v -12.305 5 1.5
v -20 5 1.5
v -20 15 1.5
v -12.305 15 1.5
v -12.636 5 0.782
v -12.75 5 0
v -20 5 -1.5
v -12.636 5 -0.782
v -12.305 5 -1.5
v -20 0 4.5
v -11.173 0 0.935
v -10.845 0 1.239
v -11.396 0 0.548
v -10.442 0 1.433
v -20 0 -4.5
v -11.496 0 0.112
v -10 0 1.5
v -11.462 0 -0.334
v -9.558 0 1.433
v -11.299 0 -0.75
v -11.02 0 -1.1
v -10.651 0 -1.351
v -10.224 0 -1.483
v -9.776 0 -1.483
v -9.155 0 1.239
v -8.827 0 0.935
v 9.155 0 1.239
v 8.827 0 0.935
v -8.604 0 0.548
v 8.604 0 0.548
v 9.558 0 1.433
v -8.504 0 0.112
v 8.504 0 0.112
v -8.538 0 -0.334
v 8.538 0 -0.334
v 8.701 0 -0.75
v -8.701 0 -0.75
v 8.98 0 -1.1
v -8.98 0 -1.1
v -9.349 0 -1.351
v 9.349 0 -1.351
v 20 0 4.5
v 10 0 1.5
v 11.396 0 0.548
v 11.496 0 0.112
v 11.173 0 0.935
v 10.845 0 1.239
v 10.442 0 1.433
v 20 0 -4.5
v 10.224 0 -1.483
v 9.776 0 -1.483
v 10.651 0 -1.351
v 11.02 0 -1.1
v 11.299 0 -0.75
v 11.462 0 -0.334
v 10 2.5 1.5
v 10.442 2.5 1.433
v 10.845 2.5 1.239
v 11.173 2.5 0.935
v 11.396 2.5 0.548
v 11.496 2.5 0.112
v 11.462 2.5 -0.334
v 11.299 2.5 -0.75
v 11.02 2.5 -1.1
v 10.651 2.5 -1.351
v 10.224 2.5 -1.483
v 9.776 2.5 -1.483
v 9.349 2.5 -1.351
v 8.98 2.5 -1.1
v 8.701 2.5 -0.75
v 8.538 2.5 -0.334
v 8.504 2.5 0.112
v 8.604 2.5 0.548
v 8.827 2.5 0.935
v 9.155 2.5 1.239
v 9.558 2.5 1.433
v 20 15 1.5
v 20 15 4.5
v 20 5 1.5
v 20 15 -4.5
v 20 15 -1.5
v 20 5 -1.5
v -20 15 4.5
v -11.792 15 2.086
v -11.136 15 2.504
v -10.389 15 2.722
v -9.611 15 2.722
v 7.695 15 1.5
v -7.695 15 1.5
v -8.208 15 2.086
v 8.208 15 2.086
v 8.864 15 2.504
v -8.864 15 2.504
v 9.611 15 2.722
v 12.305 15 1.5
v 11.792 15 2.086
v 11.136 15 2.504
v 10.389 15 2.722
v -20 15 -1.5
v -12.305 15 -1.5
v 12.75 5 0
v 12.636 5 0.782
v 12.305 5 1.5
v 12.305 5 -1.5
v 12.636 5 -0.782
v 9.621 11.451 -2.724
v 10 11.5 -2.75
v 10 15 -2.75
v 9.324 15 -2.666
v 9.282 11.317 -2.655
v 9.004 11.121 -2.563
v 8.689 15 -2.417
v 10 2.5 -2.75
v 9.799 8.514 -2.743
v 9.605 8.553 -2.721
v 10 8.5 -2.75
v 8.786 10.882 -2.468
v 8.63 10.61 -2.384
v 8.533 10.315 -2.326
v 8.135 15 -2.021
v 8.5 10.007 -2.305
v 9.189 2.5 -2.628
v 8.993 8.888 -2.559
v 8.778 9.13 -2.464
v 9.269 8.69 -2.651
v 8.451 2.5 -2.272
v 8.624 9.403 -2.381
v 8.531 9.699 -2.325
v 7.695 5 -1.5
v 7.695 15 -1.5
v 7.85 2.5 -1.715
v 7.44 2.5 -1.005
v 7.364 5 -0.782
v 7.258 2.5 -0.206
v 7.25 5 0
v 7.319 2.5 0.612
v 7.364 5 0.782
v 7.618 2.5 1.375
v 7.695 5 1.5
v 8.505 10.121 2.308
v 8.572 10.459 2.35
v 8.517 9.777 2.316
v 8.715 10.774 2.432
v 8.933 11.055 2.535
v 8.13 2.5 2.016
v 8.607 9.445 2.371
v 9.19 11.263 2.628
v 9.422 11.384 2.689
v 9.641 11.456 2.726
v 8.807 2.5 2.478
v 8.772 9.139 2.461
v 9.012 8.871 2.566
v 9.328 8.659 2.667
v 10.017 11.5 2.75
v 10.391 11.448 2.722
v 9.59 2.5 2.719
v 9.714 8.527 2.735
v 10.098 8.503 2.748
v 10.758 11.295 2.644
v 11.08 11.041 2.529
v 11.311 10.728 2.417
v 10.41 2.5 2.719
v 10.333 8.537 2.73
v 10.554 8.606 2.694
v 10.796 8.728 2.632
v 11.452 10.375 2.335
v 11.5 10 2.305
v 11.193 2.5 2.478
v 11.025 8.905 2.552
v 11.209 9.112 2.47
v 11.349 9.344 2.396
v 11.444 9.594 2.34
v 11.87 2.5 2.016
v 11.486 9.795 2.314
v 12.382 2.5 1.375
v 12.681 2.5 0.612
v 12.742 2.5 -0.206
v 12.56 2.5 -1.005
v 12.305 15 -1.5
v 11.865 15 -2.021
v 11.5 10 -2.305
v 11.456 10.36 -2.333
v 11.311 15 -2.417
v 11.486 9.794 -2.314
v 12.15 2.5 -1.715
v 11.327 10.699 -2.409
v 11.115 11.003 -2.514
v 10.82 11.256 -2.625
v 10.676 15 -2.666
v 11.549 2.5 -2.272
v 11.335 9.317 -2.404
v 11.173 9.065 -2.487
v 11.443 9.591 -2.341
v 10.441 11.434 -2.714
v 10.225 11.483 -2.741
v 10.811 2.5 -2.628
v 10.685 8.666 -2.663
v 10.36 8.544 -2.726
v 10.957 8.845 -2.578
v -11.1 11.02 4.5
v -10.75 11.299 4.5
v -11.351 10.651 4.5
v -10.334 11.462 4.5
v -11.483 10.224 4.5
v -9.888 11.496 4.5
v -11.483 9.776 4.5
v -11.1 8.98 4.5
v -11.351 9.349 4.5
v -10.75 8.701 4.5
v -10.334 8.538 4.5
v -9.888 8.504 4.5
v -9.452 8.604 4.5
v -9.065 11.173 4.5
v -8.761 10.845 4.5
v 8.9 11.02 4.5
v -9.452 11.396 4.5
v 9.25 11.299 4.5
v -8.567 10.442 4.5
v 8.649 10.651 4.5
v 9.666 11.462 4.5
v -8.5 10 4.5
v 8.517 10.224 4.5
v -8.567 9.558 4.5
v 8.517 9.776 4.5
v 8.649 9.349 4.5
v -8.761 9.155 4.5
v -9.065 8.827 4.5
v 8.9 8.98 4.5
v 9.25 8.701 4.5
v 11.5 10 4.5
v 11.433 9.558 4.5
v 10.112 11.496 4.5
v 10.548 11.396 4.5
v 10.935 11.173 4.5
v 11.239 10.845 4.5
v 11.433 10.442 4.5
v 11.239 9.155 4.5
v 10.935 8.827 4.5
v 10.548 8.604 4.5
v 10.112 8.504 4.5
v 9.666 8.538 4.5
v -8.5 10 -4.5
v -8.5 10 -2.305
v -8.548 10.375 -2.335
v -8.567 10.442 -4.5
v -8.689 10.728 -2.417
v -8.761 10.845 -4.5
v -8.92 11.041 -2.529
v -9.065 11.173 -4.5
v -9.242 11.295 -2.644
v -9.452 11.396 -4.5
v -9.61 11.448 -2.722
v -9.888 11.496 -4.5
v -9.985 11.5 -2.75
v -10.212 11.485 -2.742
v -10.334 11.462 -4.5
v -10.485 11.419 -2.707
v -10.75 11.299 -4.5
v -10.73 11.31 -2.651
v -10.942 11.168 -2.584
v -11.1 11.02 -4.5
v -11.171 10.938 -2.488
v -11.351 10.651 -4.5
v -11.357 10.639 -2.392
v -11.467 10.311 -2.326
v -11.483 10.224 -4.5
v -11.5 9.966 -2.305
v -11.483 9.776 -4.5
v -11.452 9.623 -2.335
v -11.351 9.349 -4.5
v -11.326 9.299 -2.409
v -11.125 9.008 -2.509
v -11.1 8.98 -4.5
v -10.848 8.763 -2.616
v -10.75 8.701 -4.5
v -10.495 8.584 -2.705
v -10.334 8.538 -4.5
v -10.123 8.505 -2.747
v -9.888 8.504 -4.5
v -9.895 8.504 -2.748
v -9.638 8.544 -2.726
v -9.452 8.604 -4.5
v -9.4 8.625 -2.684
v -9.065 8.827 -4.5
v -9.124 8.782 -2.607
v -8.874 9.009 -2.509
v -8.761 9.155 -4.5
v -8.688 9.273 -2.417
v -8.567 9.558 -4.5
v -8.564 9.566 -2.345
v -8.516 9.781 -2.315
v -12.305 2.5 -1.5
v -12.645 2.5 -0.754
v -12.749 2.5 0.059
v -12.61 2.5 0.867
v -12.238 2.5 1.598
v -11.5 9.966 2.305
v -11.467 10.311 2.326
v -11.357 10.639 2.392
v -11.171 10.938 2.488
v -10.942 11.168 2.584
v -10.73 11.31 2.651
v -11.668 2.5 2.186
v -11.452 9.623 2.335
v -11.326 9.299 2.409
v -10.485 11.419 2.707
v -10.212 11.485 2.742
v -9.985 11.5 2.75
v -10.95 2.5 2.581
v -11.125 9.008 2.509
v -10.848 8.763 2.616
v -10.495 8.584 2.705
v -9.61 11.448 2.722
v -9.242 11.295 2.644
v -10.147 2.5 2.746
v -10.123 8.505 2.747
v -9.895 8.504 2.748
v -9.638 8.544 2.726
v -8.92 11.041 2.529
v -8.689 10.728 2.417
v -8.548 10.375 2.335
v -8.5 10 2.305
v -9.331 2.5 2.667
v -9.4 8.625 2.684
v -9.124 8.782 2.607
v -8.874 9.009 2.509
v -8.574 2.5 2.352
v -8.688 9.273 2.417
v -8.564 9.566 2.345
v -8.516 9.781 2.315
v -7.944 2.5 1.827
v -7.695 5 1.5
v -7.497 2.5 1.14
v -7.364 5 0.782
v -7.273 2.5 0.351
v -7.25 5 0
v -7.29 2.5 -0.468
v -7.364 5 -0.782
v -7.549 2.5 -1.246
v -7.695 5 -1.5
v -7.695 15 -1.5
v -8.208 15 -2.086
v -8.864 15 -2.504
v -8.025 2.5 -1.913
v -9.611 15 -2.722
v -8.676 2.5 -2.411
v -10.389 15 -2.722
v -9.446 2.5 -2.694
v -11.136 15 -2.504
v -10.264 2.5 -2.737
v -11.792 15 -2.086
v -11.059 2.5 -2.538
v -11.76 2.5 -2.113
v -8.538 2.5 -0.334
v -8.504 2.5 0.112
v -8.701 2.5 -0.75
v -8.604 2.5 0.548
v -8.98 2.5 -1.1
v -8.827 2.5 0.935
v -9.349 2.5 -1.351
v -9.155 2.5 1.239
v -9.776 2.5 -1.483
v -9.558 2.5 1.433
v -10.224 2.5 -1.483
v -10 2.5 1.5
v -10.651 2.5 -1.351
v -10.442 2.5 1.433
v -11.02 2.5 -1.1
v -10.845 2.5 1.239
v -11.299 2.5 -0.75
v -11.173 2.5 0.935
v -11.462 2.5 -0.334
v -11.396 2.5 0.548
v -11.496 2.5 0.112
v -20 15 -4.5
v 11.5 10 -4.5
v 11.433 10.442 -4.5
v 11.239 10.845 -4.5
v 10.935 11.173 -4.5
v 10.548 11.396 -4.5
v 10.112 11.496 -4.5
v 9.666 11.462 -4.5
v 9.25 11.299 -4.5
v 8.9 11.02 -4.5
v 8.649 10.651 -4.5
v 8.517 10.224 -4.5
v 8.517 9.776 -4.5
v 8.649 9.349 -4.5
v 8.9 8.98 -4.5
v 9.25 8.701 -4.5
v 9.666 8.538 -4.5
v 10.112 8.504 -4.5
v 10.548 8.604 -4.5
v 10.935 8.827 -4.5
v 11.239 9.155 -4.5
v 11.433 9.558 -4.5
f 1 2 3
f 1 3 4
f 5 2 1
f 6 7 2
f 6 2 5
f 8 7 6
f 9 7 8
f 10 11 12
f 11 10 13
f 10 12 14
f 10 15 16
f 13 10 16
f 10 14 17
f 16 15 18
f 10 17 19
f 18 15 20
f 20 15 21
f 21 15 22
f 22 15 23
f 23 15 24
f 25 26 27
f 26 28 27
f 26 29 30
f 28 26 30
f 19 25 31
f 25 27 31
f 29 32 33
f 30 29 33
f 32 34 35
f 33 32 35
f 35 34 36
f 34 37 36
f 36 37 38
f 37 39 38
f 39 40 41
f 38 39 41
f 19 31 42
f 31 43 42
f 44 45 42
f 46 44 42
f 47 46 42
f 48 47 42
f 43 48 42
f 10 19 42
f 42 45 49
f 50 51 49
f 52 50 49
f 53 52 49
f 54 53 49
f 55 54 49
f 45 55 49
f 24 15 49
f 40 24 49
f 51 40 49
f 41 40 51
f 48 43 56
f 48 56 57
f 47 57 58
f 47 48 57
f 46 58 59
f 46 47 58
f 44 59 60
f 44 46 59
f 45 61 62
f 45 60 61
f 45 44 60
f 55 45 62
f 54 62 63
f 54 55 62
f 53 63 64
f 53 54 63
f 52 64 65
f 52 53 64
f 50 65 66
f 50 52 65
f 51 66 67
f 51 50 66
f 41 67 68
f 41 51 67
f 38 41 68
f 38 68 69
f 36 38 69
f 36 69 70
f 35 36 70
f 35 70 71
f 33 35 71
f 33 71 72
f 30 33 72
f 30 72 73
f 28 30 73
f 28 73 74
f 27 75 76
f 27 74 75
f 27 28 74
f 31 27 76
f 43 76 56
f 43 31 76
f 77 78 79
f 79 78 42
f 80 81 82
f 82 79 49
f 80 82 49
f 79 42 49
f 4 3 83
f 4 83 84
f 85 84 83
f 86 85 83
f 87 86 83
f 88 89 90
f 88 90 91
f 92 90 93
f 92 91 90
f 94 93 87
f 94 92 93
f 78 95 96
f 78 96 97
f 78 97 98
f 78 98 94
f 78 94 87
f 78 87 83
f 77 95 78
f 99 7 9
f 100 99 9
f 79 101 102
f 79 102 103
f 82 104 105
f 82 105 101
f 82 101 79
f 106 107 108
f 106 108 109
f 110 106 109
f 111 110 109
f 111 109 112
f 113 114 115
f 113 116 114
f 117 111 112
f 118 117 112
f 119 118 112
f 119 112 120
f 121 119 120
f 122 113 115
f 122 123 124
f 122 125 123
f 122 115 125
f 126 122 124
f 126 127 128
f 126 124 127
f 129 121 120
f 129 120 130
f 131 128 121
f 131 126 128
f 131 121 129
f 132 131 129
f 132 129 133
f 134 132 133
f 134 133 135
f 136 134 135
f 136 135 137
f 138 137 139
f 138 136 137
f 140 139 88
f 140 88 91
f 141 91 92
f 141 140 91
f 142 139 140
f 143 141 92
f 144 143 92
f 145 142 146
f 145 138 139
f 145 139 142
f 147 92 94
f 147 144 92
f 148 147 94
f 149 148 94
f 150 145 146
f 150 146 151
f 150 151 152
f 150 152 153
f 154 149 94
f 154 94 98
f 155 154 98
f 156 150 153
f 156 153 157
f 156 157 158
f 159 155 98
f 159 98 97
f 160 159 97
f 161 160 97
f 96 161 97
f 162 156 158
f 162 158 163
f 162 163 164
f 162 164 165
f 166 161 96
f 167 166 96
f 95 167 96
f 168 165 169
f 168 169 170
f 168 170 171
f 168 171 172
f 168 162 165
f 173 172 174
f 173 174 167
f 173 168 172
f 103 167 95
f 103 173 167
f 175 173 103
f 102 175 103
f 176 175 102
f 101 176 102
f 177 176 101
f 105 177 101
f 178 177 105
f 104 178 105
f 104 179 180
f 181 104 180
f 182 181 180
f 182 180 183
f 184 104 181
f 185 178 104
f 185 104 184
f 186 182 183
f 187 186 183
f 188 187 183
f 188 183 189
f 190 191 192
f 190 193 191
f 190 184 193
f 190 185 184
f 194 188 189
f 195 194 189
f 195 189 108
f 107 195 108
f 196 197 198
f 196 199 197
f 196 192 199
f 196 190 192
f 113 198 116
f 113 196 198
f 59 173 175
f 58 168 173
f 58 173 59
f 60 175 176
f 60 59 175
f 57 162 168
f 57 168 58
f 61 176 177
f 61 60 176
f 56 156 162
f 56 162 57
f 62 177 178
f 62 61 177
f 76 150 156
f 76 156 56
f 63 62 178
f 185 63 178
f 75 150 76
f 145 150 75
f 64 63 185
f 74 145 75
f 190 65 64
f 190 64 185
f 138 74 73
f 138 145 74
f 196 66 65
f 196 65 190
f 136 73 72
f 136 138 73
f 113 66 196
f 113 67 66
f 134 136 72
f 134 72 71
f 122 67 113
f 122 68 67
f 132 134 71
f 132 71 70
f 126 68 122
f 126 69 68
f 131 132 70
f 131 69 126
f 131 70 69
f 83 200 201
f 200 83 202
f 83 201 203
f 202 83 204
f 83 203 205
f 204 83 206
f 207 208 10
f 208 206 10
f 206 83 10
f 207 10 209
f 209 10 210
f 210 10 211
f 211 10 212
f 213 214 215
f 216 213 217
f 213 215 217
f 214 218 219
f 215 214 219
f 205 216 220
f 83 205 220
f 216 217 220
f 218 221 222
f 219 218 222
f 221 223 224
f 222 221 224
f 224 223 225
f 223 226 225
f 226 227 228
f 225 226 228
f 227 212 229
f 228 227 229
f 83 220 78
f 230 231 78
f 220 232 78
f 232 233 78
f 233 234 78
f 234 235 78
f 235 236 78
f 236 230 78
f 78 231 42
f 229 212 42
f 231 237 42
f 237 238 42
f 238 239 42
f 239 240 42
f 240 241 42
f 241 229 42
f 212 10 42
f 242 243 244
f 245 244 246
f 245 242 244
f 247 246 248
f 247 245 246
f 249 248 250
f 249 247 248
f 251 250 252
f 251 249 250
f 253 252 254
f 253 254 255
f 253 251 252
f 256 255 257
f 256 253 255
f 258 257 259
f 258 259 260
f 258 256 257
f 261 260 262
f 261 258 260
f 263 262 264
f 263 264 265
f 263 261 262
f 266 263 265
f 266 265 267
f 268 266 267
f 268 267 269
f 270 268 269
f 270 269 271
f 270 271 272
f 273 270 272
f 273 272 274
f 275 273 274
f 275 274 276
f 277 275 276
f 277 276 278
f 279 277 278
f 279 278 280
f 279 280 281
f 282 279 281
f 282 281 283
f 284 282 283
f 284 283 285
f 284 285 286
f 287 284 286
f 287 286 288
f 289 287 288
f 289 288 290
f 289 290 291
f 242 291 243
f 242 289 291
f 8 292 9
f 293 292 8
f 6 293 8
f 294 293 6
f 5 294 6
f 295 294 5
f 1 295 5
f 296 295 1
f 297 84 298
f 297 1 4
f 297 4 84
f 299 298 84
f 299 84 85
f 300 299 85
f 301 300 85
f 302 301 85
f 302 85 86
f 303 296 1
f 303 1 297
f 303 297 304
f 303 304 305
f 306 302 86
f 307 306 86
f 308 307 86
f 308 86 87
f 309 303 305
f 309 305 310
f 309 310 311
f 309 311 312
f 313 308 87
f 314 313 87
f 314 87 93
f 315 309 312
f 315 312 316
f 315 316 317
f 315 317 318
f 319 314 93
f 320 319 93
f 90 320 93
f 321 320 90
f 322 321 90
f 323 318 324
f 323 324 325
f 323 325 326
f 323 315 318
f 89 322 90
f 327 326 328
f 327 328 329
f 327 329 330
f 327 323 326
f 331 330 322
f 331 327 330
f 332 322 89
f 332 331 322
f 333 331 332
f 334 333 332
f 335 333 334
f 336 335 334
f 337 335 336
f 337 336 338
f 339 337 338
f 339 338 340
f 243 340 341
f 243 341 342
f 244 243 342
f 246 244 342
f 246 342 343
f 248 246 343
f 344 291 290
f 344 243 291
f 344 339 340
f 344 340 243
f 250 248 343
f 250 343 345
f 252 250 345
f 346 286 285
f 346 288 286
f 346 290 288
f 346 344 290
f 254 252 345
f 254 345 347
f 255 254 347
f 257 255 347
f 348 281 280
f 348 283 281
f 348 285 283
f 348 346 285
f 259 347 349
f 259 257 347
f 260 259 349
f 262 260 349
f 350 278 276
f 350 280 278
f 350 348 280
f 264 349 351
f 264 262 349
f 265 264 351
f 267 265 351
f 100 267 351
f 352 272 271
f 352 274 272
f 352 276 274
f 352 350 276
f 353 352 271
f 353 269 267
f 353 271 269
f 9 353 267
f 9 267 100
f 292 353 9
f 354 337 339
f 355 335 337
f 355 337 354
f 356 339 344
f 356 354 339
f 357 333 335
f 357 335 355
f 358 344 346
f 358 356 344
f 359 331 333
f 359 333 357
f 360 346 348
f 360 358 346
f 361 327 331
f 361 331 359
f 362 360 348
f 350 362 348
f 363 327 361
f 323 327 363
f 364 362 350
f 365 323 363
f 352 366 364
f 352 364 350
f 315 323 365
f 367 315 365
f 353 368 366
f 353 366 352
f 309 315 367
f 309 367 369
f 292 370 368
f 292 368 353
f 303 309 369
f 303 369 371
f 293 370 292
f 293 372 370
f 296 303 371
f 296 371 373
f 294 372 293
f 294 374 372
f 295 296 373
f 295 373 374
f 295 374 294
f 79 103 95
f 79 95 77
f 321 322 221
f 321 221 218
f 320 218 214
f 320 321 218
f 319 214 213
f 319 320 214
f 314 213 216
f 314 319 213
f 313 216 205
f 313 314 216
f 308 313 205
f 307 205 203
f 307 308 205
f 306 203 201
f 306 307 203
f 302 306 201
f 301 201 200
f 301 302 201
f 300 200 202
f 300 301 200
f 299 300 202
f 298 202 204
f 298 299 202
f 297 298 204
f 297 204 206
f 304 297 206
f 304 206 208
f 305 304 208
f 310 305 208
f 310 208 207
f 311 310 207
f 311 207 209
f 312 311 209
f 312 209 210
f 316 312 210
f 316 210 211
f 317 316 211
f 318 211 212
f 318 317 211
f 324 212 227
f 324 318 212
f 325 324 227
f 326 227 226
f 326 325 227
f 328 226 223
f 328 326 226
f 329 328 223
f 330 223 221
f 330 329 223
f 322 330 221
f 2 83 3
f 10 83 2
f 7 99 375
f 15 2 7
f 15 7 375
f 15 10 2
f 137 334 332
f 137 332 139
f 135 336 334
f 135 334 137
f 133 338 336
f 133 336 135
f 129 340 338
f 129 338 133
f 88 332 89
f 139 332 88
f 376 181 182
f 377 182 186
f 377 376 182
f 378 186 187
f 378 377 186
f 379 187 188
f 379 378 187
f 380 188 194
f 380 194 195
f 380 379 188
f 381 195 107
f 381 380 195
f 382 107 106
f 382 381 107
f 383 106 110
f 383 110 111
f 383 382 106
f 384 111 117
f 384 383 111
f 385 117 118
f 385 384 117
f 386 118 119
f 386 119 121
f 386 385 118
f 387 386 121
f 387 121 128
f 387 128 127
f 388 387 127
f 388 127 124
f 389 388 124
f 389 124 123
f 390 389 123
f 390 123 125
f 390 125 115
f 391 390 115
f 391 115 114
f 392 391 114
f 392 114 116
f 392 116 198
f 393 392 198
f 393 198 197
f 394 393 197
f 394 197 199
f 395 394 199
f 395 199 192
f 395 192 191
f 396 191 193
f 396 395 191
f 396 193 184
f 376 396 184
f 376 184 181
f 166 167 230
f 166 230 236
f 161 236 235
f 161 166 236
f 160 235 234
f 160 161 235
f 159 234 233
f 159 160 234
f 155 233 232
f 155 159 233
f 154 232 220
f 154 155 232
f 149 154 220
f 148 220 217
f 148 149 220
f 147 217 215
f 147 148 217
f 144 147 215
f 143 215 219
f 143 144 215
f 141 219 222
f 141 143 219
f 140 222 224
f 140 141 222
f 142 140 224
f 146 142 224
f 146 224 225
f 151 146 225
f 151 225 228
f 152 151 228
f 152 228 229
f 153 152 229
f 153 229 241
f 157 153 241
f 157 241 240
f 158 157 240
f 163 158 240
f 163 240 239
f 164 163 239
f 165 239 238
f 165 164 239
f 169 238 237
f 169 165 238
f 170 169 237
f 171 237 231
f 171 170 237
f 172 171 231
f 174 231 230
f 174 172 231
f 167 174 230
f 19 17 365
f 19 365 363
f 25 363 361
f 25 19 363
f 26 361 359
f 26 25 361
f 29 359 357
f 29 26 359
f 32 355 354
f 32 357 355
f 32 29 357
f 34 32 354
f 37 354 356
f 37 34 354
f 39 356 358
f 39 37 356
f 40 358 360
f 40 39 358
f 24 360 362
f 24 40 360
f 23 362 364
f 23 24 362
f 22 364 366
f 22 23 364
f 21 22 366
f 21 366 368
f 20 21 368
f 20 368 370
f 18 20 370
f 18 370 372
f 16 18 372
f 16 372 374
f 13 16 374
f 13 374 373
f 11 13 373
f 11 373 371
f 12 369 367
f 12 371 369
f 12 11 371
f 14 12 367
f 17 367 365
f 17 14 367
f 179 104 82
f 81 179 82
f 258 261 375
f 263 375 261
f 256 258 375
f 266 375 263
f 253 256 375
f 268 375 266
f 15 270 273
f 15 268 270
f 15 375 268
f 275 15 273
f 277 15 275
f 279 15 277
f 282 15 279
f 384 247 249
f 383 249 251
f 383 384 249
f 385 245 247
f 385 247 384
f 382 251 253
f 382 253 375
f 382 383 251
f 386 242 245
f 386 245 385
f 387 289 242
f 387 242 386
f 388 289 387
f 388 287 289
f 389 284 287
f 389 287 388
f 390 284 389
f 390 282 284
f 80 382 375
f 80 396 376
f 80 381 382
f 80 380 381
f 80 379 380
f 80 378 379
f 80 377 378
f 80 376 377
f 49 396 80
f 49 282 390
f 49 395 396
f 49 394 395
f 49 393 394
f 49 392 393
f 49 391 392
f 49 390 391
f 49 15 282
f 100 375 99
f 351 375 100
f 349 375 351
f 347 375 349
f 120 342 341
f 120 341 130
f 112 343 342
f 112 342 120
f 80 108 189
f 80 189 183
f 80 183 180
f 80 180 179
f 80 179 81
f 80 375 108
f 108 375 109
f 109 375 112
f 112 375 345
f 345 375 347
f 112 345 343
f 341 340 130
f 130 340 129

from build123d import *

# Parameters (mm, degrees)
SKETCH1_W               = 40
SKETCH1_H               = 9
BOSS_EXTRUDE1_DEPTH     = 5
SKETCH2_W               = 40
SKETCH2_H               = 3
BOSS_EXTRUDE4_DEPTH     = 10
CUT_EXTRUDE5_DEPTH      = 26.401771592
CUT_EXTRUDE5_DEPTH_BACK = 12.5
SKETCH4_R               = 2.75
CUT_EXTRUDE6_DEPTH      = 25.010414407
CUT_EXTRUDE6_DEPTH_BACK = 25.010414407
SKETCH5_R               = 1.5
CUT_EXTRUDE7_DEPTH      = 27.570660511
CUT_EXTRUDE7_DEPTH_BACK = 27.570660511
SKETCH6_R               = 1.5


with BuildPart() as part:
    # Sketch1 → Boss-Extrude1 (new body)
    with BuildSketch(Plane(origin=(0, 0, 0), x_dir=(1, 0, 0), z_dir=(0, 1, 0))):
        Rectangle(SKETCH1_W, SKETCH1_H)
    extrude(amount=BOSS_EXTRUDE1_DEPTH)

    # Sketch2 → Boss-Extrude4 (add)
    with BuildSketch(Plane(origin=(0, 5, 0), x_dir=(1, 0, 0), z_dir=(0, 1, 0))):
        with Locations((0, 3)):
            Rectangle(SKETCH2_W, SKETCH2_H)
        with Locations((0, -3)):
            Rectangle(SKETCH2_W, SKETCH2_H)
    extrude(amount=BOSS_EXTRUDE4_DEPTH)

    # Sketch4 → Cut-Extrude5 (cut, two sides: drawn at the far end of the back side and taken through both)
    with BuildSketch(Plane(origin=(0, 15, 0), x_dir=(1, 0, 0), z_dir=(0, 1, 0)).offset(-CUT_EXTRUDE5_DEPTH_BACK)):
        with Locations(Location((-10, 0, 0), (0, 0, 146.944268849))):
            Circle(SKETCH4_R)
        with Locations(Location((10, 0, 0), (0, 0, 90))):
            Circle(SKETCH4_R)
    extrude(amount=CUT_EXTRUDE5_DEPTH + CUT_EXTRUDE5_DEPTH_BACK, mode=Mode.SUBTRACT)

    # Sketch5 → Cut-Extrude6 (cut, two sides: drawn at the far end of the back side and taken through both)
    with BuildSketch(Plane(origin=(0, 2.5, 0), x_dir=(1, 0, 0), z_dir=(0, 1, 0)).offset(-CUT_EXTRUDE6_DEPTH_BACK)):
        with Locations(Location((-10, 0, 0), (0, 0, 270))):
            Circle(SKETCH5_R)
        with Locations(Location((10, 0, 0), (0, 0, 270))):
            Circle(SKETCH5_R)
    extrude(amount=CUT_EXTRUDE6_DEPTH + CUT_EXTRUDE6_DEPTH_BACK, mode=Mode.SUBTRACT)

    # Sketch6 → Cut-Extrude7 (cut, two sides: drawn at the far end of the back side and taken through both)
    with BuildSketch(Plane.XY.offset(4.5).offset(-CUT_EXTRUDE7_DEPTH_BACK)):
        with Locations((-10, 10)):
            Circle(SKETCH6_R)
        with Locations((10, 10)):
            Circle(SKETCH6_R)
    extrude(amount=CUT_EXTRUDE7_DEPTH + CUT_EXTRUDE7_DEPTH_BACK, mode=Mode.SUBTRACT)


solid = part.part
